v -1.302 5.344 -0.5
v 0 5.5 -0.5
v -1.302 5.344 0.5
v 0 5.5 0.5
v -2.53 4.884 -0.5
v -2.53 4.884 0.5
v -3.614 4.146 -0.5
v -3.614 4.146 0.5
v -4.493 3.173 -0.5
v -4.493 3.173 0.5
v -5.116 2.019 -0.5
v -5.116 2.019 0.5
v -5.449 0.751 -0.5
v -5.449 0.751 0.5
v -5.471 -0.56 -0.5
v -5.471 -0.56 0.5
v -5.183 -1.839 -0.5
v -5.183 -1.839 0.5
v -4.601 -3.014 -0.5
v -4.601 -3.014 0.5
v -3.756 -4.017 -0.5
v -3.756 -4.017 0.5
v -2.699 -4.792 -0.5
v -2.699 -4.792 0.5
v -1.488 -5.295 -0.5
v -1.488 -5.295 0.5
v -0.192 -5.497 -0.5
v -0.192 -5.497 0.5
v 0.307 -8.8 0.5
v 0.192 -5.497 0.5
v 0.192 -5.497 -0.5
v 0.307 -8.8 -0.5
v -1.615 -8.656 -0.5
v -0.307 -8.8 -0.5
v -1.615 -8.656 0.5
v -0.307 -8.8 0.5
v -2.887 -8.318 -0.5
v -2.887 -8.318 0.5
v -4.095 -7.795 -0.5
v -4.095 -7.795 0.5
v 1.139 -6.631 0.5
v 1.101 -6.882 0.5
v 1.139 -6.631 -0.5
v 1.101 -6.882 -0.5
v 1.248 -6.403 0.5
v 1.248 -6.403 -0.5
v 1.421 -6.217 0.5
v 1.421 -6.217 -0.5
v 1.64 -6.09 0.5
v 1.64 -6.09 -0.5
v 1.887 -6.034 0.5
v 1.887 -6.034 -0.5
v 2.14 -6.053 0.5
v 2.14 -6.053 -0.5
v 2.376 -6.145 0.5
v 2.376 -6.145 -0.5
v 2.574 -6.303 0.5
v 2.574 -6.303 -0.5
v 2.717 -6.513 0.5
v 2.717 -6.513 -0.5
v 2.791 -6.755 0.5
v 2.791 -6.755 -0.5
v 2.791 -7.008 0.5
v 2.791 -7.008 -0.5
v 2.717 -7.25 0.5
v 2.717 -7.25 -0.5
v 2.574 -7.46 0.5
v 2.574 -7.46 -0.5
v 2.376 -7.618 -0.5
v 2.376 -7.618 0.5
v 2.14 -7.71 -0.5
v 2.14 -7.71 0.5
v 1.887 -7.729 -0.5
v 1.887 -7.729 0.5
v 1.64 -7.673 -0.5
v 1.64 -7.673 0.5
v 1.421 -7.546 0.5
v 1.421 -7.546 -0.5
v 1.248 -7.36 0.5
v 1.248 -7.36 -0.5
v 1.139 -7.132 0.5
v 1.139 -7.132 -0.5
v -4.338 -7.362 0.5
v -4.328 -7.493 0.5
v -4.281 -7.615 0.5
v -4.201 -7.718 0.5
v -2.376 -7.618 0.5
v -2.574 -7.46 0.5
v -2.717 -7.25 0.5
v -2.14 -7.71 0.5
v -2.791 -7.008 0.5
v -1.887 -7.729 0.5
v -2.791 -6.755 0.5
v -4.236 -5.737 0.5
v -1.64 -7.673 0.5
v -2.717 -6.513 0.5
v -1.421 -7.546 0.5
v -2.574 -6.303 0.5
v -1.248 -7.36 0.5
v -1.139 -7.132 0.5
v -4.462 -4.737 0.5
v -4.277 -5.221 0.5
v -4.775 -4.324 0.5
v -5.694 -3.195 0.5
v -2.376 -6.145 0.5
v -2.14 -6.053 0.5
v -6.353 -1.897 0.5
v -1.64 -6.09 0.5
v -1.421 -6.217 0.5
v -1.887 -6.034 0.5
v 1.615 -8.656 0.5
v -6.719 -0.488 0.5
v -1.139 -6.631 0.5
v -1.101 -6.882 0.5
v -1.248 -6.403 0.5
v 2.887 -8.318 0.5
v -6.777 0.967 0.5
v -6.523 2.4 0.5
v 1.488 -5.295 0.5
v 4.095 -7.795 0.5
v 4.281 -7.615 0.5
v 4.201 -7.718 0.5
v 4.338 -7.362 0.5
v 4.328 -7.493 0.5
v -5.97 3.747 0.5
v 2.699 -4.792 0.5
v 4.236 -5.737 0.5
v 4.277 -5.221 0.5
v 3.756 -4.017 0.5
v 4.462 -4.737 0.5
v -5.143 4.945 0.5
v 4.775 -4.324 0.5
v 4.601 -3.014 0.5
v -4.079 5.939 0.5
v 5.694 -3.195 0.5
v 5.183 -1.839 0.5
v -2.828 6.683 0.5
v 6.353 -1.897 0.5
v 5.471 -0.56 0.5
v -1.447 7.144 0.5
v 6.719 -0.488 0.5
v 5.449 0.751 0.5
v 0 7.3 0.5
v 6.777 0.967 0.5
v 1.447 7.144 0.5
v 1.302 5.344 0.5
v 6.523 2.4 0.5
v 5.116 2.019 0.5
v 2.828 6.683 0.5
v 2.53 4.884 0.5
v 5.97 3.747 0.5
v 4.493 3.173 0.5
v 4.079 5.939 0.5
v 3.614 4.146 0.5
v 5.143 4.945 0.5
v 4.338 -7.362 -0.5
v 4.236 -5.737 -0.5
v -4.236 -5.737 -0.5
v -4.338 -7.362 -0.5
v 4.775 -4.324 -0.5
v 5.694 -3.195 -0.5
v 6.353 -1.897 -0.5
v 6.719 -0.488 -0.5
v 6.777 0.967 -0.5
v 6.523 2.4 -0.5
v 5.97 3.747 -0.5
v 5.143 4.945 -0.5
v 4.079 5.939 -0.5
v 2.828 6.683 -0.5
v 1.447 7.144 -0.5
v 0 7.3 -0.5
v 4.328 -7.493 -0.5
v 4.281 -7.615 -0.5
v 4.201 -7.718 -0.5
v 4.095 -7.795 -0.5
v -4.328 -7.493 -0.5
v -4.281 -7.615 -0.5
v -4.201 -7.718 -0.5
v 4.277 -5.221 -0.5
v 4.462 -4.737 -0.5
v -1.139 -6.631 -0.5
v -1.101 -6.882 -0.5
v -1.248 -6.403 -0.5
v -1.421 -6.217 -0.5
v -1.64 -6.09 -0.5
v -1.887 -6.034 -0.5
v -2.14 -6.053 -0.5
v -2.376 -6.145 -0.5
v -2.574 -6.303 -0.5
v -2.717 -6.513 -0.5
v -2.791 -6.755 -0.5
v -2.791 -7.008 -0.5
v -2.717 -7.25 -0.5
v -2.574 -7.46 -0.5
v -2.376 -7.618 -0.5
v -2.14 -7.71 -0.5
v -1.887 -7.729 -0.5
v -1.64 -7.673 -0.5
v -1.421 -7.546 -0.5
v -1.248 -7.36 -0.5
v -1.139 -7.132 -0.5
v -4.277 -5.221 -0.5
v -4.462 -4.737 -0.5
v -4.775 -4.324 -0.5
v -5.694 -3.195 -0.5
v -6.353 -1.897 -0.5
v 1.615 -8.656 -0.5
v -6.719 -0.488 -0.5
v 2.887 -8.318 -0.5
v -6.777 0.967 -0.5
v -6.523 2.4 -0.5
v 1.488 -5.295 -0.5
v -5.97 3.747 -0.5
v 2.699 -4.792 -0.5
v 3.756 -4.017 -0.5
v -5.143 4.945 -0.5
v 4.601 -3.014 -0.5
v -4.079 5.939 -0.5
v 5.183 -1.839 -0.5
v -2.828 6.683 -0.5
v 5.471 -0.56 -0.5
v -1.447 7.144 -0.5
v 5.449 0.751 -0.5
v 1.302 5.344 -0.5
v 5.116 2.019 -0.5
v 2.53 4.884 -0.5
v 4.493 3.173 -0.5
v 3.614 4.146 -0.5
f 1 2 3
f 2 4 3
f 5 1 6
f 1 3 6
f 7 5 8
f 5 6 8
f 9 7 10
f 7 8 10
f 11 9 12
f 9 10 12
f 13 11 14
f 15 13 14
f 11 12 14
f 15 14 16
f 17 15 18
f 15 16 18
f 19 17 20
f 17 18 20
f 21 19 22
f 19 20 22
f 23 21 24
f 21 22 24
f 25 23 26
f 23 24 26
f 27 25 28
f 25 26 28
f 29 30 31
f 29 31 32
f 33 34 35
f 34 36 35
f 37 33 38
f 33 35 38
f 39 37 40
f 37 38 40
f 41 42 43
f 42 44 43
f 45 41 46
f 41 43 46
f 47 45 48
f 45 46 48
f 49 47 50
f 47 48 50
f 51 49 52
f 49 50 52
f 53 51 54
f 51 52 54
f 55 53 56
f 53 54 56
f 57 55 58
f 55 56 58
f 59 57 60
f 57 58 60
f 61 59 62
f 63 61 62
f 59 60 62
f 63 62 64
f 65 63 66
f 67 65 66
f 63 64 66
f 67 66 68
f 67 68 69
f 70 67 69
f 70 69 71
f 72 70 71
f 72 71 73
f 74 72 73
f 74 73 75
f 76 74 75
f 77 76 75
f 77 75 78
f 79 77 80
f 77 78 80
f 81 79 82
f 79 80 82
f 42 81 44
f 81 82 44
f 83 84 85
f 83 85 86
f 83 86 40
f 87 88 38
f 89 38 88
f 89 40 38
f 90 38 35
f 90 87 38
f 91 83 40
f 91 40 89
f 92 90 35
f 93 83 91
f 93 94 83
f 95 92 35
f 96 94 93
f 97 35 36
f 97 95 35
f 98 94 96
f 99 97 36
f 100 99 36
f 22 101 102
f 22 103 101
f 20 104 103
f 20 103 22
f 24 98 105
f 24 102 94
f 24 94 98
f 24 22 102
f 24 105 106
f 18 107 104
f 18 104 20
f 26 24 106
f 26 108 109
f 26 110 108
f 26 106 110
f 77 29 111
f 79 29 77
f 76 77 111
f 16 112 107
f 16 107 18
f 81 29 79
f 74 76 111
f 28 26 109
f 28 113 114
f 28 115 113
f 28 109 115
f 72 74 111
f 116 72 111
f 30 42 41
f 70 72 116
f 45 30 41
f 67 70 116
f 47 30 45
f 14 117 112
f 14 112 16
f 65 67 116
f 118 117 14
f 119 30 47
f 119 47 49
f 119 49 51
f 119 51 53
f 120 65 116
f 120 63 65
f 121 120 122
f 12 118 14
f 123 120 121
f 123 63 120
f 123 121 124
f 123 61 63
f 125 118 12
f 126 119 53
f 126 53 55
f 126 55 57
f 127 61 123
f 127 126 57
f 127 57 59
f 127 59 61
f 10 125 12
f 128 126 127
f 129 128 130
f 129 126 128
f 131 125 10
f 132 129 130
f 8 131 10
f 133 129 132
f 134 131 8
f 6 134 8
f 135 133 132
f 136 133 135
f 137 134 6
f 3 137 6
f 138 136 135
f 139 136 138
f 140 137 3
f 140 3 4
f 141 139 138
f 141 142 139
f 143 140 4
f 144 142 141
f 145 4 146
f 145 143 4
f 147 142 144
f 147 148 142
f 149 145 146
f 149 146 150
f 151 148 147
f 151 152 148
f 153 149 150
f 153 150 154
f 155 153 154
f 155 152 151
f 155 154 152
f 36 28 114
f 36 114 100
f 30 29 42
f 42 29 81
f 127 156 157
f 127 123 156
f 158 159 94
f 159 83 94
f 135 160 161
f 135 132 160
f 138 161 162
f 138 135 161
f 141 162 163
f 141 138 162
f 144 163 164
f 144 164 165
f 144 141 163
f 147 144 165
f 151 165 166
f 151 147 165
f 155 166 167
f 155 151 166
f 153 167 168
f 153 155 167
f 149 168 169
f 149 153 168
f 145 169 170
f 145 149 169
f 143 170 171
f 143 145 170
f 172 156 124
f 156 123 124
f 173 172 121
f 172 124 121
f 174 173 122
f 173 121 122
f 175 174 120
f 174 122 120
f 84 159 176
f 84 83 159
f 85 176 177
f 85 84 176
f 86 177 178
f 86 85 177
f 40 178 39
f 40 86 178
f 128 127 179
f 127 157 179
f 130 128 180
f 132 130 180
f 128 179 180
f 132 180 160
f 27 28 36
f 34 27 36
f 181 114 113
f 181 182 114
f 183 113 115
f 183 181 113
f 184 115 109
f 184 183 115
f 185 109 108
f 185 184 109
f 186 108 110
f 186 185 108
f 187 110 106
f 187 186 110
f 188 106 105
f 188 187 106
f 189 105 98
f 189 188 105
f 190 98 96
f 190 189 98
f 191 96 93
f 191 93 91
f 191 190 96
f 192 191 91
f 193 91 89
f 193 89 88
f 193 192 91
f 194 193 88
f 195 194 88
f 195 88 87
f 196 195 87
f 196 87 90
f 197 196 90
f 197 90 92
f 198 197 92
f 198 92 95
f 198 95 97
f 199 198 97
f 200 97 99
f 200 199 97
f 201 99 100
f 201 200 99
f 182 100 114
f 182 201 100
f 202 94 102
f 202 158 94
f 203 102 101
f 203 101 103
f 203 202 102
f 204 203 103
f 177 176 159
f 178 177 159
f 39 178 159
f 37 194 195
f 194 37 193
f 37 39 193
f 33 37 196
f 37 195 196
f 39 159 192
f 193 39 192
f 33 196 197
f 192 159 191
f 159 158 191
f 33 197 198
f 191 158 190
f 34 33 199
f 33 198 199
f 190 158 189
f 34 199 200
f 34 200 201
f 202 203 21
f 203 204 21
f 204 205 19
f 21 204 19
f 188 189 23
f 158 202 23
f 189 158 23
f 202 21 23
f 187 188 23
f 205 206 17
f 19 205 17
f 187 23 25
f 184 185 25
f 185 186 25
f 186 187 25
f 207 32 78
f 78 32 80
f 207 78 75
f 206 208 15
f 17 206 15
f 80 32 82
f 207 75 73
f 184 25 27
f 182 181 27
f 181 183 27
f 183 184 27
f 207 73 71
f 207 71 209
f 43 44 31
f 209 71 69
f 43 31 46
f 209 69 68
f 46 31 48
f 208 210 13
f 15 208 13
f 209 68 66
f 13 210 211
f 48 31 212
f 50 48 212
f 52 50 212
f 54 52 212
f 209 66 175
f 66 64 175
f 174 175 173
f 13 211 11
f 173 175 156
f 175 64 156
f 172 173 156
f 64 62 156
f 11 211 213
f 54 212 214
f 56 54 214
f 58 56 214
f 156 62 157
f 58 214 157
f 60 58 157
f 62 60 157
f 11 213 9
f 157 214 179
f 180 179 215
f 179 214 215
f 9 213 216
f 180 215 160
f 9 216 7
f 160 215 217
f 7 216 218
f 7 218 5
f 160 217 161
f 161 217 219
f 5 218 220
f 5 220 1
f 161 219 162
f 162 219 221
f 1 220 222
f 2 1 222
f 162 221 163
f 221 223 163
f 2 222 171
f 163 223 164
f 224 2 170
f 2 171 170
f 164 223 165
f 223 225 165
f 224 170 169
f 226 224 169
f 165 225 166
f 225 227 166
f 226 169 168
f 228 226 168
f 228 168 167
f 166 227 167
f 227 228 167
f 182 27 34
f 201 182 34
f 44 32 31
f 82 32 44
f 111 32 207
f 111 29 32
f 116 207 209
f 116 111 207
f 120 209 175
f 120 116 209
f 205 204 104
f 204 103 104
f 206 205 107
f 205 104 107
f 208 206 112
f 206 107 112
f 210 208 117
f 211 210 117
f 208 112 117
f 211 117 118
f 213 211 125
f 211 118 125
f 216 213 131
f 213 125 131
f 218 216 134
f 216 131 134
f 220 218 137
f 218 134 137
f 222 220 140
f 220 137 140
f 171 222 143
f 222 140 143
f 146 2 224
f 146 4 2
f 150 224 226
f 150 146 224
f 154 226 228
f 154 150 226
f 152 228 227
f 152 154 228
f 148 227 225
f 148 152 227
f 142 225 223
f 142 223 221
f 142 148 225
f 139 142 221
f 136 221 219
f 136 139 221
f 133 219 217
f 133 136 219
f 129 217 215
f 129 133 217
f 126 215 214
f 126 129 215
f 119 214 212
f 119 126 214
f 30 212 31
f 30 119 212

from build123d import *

# Parameters (mm, degrees)
SKETCH4_R           = 0.85
BOSS_EXTRUDE1_DEPTH = 0.5
FILLET1_R           = 1.826259158
FILLET2_R           = 0.456564789


with BuildPart() as part:
    # Sketch4 → Boss-Extrude1 (new body, symmetric)
    with BuildSketch(Plane.XY):
        with BuildLine():
            Line((-4.356605307, -7.652086329), (-4.179645962, -4.84670606))
            ThreePointArc((-4.179645962, -4.84670606), (-6.422848054, 2.717628201), (0, 7.3))
            Line((0, 7.3), (0, 5.5))
            ThreePointArc((0, 5.5), (-5.499162323, 0.095988235), (-0.191947232, -5.496649549))
            Line((-0.191947232, -5.496649549), (-0.307302772, -8.8))
            ThreePointArc((-0.307302772, -8.8), (-2.401548686, -8.471540527), (-4.356605307, -7.652086329))
        make_face()
        with Locations((-1.950801133, -6.88151398)):
            Circle(SKETCH4_R, mode=Mode.SUBTRACT)
    extrude(amount=BOSS_EXTRUDE1_DEPTH, both=True)

    # Fillet1
    fillet1_edges = [part.edges().sort_by_distance(p)[0] for p in [
        (-4.179645962, -4.84670606, 0),
    ]]
    fillet(fillet1_edges, radius=FILLET1_R)

    # Fillet2
    fillet2_edges = [part.edges().sort_by_distance(p)[0] for p in [
        (-4.356605307, -7.652086329, 0),
    ]]
    fillet(fillet2_edges, radius=FILLET2_R)

    # Mirror1: part across plane


with BuildPart() as part_1:
    add(part.part)
    add(part.part.mirror(Plane(origin=(0, 7.3, 0.5), x_dir=(0, 0, 1), z_dir=(-1, 0, 0))))


solid = part_1.part
